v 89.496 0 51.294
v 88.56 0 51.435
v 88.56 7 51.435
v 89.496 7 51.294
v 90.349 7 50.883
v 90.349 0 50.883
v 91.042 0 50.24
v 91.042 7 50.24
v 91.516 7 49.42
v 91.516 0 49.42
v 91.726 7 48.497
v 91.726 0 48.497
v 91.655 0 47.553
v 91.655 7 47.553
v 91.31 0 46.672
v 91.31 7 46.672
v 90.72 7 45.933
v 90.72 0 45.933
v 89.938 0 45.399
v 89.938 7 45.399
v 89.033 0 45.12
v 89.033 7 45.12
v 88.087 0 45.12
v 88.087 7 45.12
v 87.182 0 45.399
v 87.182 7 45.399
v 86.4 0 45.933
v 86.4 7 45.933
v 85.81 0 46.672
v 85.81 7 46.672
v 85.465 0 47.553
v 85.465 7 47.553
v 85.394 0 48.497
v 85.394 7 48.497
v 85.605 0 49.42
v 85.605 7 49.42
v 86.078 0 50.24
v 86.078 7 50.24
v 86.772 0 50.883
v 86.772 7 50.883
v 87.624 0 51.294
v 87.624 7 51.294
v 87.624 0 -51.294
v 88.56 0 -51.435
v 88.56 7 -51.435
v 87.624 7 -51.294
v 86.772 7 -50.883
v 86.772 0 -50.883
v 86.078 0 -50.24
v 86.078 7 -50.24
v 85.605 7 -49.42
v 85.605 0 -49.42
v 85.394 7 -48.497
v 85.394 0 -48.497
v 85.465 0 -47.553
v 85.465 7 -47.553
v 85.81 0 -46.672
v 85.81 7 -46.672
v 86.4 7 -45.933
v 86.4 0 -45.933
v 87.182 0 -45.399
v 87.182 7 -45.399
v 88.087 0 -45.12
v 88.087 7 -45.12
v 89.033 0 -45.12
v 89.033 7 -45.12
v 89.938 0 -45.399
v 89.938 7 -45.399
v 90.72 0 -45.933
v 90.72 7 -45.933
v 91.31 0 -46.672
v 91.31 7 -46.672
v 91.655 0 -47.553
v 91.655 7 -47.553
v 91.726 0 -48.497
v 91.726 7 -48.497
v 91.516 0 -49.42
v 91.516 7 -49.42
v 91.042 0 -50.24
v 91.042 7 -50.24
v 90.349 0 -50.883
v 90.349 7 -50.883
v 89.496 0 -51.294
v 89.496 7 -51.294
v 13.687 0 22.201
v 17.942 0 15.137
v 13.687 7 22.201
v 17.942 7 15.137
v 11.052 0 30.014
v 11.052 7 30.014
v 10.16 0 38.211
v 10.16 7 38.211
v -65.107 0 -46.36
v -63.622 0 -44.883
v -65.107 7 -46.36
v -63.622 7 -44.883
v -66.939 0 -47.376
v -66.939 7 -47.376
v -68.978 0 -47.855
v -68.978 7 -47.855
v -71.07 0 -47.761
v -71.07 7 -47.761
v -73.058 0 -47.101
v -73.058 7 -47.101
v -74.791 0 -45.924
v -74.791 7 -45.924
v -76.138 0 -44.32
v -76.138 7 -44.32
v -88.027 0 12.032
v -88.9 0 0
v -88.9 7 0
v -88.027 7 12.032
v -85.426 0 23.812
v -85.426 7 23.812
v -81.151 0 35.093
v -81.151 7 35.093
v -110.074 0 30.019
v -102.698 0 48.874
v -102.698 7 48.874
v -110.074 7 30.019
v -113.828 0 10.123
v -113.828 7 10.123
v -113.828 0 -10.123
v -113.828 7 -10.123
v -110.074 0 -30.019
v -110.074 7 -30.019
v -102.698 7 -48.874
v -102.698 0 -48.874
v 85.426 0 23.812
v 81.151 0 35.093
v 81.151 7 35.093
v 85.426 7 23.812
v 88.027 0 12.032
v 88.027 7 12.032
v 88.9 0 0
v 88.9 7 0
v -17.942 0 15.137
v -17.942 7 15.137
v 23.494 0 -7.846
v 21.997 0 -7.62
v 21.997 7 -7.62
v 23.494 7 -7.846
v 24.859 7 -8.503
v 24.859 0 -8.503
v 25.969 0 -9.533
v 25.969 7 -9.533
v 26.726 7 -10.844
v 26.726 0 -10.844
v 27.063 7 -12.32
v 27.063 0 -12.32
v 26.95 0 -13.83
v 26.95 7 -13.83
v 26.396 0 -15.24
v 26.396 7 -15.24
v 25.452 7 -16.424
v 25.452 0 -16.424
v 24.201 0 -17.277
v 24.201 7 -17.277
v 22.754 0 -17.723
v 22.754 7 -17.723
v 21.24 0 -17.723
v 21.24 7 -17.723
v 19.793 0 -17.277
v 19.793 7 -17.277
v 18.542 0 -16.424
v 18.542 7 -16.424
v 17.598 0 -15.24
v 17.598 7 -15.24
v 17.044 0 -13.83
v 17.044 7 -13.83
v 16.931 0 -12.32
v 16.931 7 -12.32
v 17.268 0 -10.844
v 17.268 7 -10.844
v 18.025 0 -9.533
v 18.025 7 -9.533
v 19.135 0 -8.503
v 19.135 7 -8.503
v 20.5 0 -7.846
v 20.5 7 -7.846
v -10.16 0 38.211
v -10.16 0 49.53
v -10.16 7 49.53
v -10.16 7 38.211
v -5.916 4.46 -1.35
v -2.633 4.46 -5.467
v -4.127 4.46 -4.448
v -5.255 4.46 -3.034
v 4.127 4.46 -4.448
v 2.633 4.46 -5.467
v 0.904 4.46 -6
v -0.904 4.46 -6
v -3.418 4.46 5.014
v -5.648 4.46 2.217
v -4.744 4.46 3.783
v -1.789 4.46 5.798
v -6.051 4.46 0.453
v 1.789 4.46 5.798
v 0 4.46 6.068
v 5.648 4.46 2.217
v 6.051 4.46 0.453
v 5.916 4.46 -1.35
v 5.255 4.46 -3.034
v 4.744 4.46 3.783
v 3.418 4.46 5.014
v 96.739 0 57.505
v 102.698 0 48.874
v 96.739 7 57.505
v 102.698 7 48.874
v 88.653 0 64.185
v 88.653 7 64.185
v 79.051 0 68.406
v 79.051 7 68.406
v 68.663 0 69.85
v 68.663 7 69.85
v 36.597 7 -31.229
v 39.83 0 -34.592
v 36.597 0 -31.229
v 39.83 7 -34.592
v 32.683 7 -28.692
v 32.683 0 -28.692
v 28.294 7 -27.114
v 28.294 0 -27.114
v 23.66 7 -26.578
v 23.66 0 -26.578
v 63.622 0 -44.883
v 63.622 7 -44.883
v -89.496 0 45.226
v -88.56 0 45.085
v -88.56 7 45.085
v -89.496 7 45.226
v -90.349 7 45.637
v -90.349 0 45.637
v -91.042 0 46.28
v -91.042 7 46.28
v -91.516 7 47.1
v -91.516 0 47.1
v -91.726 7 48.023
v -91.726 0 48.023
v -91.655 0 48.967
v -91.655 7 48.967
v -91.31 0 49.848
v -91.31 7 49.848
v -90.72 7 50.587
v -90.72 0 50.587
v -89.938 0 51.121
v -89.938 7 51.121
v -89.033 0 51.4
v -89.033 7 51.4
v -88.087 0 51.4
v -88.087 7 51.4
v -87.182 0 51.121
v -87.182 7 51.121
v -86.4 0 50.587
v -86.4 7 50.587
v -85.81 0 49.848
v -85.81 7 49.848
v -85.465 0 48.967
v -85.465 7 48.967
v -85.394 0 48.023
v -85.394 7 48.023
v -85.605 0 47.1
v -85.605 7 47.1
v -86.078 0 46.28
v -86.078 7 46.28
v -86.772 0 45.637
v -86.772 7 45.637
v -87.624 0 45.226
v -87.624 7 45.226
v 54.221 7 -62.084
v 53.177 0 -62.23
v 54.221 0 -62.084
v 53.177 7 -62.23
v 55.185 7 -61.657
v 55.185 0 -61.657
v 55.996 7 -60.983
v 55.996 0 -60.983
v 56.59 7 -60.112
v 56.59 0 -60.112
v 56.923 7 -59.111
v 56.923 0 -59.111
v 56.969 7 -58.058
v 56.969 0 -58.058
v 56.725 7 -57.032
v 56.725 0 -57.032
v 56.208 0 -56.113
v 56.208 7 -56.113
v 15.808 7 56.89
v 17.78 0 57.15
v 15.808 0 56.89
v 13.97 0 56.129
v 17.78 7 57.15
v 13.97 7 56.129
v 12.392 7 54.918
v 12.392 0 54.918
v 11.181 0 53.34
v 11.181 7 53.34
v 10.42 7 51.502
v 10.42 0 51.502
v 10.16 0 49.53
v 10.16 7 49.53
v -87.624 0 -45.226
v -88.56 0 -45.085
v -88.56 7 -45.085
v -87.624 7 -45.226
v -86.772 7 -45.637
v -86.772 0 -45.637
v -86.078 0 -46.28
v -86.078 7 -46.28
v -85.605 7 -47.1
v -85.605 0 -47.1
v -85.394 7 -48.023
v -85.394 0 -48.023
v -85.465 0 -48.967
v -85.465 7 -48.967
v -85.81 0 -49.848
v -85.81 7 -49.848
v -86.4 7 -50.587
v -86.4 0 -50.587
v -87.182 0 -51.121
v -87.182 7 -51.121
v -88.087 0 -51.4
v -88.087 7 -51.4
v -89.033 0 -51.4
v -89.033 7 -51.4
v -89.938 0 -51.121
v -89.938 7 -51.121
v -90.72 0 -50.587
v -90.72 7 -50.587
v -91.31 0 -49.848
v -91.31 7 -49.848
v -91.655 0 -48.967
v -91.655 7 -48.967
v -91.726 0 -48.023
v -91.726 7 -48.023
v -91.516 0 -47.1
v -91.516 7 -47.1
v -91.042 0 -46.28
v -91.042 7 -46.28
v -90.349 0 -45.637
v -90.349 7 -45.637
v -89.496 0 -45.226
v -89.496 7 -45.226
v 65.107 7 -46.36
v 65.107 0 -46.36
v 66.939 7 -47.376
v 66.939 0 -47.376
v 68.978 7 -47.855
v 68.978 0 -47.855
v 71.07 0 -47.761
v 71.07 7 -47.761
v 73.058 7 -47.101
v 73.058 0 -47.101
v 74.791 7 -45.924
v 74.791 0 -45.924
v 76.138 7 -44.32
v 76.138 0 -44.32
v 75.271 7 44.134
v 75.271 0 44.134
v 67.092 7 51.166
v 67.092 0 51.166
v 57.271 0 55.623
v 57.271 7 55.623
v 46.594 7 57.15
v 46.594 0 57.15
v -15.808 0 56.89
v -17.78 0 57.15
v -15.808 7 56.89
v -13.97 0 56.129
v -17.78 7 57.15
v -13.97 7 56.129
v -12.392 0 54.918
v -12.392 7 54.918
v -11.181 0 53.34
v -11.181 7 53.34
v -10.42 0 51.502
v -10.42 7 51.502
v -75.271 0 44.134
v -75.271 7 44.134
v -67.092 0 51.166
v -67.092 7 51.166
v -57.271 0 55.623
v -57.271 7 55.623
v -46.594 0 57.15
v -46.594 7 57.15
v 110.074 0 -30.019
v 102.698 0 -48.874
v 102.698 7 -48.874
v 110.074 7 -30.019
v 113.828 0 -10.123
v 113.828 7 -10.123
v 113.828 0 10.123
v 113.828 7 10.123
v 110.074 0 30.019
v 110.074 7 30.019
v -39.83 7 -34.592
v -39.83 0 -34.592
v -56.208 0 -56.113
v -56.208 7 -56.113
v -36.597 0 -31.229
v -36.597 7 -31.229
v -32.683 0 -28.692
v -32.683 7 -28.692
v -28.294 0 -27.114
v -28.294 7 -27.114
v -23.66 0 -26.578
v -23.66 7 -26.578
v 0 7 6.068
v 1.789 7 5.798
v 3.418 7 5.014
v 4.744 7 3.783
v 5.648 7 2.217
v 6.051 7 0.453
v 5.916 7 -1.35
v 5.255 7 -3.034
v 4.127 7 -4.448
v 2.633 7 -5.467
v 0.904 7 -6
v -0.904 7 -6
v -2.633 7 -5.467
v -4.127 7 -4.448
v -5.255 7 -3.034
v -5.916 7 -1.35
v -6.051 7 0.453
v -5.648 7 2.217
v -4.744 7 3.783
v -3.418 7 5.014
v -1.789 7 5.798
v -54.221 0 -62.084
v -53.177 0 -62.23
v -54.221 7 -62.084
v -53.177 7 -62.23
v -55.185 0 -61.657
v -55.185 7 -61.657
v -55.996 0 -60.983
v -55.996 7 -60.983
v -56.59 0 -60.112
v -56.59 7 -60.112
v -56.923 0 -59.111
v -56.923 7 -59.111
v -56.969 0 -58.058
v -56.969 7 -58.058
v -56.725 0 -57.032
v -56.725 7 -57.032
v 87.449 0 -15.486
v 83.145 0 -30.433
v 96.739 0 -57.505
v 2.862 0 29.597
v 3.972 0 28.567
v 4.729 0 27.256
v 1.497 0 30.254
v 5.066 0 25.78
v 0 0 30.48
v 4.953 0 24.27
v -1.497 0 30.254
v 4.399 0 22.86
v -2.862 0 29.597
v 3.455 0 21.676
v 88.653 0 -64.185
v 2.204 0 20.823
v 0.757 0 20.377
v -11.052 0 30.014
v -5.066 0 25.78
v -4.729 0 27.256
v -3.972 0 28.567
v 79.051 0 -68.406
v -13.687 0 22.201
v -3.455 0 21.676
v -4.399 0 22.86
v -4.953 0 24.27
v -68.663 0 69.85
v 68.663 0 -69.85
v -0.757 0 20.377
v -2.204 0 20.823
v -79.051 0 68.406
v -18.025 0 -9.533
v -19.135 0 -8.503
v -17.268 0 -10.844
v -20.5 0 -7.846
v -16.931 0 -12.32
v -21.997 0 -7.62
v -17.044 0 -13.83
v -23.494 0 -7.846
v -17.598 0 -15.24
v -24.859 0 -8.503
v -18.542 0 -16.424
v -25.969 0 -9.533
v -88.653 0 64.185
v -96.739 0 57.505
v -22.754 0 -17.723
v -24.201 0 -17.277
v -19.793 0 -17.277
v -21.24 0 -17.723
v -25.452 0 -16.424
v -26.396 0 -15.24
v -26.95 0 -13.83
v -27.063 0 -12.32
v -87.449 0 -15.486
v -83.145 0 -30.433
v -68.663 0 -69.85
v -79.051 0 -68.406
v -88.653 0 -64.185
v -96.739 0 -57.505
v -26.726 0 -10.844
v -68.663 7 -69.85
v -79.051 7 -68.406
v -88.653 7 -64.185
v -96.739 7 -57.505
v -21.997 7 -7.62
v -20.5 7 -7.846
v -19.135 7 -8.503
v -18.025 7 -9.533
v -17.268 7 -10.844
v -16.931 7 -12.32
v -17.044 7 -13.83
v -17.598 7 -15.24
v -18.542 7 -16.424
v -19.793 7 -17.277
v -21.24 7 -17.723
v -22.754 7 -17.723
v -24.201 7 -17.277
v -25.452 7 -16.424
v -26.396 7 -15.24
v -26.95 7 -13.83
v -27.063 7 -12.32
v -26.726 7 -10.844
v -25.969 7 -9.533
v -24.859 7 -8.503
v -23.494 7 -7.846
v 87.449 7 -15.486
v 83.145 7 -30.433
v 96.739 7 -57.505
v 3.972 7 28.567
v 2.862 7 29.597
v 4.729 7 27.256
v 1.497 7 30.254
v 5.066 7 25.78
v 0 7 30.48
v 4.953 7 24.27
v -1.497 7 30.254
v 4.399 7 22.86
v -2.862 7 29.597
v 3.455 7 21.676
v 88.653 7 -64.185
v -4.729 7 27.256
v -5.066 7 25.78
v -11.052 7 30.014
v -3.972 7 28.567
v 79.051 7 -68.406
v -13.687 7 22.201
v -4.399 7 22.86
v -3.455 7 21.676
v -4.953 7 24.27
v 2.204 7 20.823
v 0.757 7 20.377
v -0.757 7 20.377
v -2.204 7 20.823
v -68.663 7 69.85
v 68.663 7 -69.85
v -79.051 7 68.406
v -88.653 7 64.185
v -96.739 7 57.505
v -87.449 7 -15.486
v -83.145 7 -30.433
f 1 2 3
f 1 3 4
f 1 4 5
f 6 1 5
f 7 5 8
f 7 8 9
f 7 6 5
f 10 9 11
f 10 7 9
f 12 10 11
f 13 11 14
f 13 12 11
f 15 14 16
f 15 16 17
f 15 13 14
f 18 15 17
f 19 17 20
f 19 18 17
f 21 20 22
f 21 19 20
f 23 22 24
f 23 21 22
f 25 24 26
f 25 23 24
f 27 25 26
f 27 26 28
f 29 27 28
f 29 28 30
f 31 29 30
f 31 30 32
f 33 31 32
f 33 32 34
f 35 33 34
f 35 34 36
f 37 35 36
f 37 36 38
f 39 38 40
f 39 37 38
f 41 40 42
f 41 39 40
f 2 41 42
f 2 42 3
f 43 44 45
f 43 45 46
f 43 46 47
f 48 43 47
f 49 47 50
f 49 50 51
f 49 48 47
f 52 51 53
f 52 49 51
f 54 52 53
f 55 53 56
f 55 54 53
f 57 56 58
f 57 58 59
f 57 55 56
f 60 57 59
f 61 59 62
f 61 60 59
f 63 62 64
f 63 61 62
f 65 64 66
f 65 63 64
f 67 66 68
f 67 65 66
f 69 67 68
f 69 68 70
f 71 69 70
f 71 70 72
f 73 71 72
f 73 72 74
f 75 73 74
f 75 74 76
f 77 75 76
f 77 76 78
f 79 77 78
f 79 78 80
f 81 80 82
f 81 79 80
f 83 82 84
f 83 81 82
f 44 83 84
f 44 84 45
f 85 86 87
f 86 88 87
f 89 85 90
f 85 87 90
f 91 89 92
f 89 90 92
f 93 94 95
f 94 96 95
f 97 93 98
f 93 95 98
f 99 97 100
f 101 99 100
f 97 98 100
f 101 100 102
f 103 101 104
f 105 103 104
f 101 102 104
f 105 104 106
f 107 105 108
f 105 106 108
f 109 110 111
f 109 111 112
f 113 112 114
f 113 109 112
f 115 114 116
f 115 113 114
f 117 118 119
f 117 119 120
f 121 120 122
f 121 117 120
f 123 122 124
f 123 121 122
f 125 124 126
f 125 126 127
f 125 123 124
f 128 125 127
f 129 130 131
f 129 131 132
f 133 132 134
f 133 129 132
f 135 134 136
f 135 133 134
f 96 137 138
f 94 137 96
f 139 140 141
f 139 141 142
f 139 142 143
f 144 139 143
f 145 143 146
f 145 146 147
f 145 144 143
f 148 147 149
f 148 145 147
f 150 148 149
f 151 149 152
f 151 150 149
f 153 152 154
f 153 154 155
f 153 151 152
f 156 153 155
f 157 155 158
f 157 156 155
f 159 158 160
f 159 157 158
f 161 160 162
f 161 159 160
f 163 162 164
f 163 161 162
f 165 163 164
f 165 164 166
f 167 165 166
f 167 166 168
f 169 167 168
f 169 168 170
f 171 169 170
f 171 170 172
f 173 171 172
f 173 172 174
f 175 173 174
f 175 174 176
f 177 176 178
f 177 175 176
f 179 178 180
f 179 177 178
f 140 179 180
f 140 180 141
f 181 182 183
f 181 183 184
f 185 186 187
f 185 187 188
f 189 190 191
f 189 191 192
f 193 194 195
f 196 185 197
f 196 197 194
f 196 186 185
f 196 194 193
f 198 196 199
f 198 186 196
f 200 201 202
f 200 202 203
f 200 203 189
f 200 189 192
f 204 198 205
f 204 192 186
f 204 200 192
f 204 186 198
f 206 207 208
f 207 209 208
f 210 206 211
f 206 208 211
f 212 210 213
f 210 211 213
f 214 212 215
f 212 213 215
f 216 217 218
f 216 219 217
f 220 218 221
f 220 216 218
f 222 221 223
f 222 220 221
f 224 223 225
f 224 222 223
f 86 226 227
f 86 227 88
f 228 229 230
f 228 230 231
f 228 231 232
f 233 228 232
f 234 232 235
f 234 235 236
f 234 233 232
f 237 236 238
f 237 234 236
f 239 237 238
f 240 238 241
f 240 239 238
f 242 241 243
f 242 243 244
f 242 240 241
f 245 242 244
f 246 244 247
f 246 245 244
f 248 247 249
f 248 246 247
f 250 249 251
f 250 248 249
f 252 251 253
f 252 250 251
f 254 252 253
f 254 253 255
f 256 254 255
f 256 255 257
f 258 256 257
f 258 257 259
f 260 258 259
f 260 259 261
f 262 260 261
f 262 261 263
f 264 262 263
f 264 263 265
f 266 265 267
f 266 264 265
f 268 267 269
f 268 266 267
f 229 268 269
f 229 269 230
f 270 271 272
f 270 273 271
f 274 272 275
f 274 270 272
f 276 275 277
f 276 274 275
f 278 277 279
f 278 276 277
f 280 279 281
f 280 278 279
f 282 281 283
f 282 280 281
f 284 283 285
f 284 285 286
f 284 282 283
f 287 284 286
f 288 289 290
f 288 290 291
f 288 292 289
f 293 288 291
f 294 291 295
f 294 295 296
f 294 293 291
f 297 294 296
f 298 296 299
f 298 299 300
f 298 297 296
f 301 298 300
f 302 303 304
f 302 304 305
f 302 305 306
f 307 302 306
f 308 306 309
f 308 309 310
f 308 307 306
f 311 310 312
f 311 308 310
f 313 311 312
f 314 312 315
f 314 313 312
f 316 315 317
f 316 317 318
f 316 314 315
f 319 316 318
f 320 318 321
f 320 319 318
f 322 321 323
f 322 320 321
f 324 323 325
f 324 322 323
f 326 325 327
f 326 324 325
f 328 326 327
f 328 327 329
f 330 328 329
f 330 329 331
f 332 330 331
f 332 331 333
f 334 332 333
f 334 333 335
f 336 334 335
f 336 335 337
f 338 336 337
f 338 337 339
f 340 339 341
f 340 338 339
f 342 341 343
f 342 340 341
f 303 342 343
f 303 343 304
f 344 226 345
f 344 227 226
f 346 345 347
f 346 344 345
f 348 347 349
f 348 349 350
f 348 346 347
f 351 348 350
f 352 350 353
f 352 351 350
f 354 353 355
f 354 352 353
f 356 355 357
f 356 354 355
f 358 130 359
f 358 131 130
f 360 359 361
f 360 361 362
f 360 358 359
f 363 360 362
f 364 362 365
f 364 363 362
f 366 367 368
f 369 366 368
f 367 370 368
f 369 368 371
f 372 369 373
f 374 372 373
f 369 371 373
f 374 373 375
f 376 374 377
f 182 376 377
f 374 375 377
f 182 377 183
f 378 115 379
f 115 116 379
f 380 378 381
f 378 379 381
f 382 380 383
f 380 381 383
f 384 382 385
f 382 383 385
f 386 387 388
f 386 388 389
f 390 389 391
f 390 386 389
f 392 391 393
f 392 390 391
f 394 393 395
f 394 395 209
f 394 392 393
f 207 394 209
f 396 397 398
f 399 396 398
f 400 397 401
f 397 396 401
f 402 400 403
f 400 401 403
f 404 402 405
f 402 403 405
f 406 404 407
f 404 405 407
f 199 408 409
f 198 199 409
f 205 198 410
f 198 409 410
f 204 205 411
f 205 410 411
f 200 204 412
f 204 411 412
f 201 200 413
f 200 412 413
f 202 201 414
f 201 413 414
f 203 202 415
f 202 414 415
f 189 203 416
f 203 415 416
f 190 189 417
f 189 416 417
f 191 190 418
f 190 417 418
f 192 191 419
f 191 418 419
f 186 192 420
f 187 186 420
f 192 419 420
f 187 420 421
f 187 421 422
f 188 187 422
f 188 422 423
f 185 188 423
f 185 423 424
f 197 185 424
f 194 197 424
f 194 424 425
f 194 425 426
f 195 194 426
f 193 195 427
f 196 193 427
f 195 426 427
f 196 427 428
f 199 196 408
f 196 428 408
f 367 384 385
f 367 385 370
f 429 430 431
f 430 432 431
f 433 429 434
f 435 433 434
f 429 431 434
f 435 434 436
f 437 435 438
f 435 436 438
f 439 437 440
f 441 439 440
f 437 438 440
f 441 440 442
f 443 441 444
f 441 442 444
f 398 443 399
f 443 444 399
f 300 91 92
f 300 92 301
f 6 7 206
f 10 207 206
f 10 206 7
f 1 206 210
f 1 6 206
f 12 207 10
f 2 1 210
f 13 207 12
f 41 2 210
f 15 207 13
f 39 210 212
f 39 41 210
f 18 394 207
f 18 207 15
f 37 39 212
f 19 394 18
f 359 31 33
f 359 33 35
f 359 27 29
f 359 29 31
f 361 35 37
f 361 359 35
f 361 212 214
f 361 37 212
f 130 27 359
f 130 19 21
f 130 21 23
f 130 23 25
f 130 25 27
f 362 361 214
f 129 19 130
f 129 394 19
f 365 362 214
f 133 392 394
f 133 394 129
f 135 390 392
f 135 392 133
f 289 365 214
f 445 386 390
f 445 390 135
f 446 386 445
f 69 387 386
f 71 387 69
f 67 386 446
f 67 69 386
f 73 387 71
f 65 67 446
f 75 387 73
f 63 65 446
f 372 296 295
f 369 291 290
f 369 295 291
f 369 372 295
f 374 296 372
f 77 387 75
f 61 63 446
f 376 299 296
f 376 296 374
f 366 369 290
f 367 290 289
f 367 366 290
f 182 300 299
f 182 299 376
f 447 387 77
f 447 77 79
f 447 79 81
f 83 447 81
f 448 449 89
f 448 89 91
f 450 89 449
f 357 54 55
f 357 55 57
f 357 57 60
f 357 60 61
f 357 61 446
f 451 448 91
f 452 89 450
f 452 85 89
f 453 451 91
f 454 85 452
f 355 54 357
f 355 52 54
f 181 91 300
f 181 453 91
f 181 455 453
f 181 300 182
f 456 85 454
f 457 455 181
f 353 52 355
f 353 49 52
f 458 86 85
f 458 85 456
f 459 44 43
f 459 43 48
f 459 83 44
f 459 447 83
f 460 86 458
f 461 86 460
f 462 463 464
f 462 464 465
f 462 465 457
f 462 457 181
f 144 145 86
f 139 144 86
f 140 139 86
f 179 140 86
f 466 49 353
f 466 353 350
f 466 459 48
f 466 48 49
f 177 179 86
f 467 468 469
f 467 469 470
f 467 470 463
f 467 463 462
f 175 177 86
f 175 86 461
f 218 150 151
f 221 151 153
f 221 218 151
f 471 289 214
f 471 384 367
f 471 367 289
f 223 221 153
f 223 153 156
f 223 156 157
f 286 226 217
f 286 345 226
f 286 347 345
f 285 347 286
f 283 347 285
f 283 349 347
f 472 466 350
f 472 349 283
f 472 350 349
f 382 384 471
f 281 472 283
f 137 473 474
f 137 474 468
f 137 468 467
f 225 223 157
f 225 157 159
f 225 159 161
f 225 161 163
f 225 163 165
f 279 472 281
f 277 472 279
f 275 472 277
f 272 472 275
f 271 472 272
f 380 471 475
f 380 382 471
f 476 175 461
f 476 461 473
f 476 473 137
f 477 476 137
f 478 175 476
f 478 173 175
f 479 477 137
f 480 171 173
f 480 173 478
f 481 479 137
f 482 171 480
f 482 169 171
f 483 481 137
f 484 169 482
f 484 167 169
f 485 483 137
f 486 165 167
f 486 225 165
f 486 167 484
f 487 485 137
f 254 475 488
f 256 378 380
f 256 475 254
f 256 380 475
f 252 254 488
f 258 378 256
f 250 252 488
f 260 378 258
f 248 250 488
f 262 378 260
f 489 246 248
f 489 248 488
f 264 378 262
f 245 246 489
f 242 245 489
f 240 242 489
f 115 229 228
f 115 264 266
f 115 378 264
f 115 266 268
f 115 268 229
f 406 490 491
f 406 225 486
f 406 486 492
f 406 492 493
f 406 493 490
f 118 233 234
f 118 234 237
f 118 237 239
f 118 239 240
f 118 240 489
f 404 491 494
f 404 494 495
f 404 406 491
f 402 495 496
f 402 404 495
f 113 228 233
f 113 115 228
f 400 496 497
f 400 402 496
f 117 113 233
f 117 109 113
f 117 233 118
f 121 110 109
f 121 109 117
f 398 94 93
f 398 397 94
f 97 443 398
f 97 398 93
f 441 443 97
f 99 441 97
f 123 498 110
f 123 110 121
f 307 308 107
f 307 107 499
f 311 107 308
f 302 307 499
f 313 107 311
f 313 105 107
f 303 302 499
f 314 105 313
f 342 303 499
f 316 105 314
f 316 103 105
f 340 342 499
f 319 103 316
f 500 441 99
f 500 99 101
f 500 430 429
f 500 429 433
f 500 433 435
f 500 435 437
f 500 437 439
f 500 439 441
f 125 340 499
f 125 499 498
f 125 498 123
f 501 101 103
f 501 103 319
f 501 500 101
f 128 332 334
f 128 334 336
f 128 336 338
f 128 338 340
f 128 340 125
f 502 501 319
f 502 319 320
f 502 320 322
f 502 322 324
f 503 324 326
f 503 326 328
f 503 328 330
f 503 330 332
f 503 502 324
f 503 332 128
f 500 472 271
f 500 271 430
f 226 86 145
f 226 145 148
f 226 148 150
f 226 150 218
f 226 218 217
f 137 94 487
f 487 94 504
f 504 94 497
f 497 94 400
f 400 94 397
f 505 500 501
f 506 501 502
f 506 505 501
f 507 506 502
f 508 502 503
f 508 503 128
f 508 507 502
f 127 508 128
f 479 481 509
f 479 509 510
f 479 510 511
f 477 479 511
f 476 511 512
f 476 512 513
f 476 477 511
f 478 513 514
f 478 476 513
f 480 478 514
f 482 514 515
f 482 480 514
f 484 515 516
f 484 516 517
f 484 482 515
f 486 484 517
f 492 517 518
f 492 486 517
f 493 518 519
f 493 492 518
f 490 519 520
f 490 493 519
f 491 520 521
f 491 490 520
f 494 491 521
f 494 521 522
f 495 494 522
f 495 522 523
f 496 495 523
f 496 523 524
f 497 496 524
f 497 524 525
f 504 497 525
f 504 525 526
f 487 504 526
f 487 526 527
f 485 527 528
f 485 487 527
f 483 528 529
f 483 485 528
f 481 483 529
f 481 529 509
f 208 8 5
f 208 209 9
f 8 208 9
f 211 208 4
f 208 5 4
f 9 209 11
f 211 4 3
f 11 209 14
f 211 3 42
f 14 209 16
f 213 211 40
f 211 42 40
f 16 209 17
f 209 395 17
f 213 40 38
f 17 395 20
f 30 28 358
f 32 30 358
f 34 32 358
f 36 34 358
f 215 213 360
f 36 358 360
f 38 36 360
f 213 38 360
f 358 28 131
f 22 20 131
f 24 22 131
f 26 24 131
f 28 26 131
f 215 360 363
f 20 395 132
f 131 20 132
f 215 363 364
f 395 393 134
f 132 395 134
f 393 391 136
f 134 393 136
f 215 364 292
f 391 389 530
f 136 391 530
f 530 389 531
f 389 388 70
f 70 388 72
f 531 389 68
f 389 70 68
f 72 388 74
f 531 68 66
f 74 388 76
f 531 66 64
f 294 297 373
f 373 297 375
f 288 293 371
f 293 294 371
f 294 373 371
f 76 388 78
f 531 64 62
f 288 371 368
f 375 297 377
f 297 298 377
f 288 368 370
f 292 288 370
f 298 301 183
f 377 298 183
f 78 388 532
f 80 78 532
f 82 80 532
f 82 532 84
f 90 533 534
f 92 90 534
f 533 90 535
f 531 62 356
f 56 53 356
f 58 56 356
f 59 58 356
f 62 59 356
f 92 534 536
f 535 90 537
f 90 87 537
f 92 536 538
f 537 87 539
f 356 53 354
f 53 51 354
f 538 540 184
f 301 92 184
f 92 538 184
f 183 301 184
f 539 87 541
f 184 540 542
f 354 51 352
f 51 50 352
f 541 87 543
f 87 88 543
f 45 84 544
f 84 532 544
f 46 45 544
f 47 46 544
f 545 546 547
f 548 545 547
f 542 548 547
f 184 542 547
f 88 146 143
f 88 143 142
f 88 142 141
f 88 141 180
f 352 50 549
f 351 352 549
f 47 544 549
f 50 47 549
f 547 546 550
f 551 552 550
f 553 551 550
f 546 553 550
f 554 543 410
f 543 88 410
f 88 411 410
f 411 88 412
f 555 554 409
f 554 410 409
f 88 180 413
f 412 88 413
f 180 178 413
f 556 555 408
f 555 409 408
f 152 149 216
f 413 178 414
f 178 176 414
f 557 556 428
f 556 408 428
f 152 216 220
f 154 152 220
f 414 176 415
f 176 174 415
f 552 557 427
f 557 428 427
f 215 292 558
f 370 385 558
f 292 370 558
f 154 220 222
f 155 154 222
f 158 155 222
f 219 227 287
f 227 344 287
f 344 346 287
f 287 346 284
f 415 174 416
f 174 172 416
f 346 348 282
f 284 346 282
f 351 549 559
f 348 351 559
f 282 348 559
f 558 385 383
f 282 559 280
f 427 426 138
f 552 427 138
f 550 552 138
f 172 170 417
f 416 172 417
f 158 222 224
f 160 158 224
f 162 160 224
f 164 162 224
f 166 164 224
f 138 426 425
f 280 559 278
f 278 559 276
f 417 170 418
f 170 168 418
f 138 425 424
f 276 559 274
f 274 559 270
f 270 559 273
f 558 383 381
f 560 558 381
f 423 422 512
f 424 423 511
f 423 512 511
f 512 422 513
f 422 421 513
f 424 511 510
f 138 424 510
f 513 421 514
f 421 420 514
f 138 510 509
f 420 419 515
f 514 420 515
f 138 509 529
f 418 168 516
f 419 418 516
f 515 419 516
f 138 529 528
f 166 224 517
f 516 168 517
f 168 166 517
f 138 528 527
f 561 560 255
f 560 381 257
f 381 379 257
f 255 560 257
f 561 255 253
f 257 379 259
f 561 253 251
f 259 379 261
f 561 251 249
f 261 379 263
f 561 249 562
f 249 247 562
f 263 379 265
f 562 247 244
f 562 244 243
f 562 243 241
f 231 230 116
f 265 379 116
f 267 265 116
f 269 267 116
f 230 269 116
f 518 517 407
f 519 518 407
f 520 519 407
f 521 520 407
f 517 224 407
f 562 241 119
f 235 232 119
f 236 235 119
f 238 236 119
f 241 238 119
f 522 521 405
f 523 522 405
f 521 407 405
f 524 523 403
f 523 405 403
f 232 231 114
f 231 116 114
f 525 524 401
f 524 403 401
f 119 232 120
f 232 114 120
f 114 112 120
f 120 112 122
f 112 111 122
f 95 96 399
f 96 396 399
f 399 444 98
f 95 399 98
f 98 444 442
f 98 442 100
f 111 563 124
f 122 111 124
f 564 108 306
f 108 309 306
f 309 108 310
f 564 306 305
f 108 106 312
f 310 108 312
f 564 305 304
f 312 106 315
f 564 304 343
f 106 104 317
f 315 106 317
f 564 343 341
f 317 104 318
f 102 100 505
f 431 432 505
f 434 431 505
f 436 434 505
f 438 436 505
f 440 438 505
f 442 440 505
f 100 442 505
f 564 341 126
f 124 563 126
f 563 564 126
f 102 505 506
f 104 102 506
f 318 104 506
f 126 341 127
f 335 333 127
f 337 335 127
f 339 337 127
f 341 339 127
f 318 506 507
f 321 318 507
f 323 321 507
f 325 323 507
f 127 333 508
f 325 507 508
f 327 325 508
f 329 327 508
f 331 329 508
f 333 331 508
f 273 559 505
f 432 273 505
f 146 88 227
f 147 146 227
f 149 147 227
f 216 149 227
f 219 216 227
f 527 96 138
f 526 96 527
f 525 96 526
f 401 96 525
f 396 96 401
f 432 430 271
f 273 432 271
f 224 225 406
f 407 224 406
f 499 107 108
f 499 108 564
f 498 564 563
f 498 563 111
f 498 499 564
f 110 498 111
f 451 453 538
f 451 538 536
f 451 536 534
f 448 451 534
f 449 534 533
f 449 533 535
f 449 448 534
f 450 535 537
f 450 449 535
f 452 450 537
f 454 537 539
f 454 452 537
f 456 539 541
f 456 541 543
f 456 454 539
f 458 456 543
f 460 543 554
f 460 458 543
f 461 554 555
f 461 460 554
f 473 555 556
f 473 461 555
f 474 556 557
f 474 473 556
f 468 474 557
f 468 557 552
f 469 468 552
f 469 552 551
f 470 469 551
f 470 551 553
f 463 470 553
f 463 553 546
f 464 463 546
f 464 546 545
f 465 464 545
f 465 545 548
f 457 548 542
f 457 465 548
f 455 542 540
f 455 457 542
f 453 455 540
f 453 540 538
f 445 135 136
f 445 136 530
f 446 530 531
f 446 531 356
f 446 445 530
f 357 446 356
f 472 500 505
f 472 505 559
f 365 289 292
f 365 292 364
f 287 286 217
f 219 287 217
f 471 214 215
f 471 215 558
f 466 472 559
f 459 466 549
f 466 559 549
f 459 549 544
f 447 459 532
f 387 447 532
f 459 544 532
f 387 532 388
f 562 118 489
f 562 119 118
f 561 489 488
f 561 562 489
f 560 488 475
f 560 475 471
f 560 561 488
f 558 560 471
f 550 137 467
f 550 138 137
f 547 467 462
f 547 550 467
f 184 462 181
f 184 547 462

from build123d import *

# Parameters (mm, degrees)
SKETCH1_R           = 5.08
SKETCH1_R_2         = 3.175
BOSS_EXTRUDE1_DEPTH = 7
FILLET6_R           = 38.1
FILLET9_R           = 7.62
FILLET10_R          = 7.62
FILLET11_R          = 3.81
FILLET12_R          = 20.32
FILLET13_R          = 38.1
SKETCH2_R           = 6.067865864
CUT_EXTRUDE1_DEPTH  = 2.54


with BuildPart() as part:
    # Sketch1 → Boss-Extrude1 (new body)
    with BuildSketch(Plane(origin=(0, 0, 0), x_dir=(1, 0, 0), z_dir=(0, 1, 0))):
        with BuildLine():
            Line((-88.899351346, 69.85), (88.899351346, 69.85))
            ThreePointArc((88.899351346, 69.85), (114.3, 0), (88.899351346, -69.85))
            Line((88.899351346, -69.85), (-88.899351346, -69.85))
            ThreePointArc((-88.899351346, -69.85), (-114.3, 0), (-88.899351346, 69.85))
        make_face()
        with Locations(Location((0, -25.4, 0), (0, 0, 270))):
            Circle(SKETCH1_R, mode=Mode.SUBTRACT)
        with Locations(Location((-21.997045256, 12.7, 0), (0, 0, 270))):
            Circle(SKETCH1_R, mode=Mode.SUBTRACT)
        with Locations(Location((21.997045256, 12.7, 0), (0, 0, 270))):
            Circle(SKETCH1_R, mode=Mode.SUBTRACT)
        with Locations(Location((-88.560044244, 48.26, 0), (0, 0, 270))):
            Circle(SKETCH1_R_2, mode=Mode.SUBTRACT)
        with Locations(Location((-88.560044244, -48.26, 0), (0, 0, 90))):
            Circle(SKETCH1_R_2, mode=Mode.SUBTRACT)
        with Locations(Location((88.560044244, -48.26, 0), (0, 0, 270))):
            Circle(SKETCH1_R_2, mode=Mode.SUBTRACT)
        with Locations(Location((88.560044244, 48.26, 0), (0, 0, 90))):
            Circle(SKETCH1_R_2, mode=Mode.SUBTRACT)
        Polygon((-60.864265129, 62.23), (60.864265129, 62.23), (33.730665032, 26.578259891), (-33.730665032, 26.578259891), align=None, mode=Mode.SUBTRACT)
        with BuildLine():
            Line((-66.2189372, -57.15), (-10.16, -57.15))
            Line((-10.16, -57.15), (-10.16, -25.362104437))
            Line((-10.16, -25.362104437), (-69.836388427, 53.048688207))
            ThreePointArc((-69.836388427, 53.048688207), (-83.989429266, 28.185034179), (-88.9, 0))
            ThreePointArc((-88.9, 0), (-83.022483728, -30.743101298), (-66.2189372, -57.15))
        make_face(mode=Mode.SUBTRACT)
        with BuildLine():
            Line((10.16, -25.362104437), (10.16, -57.15))
            Line((10.16, -57.15), (66.2189372, -57.15))
            ThreePointArc((66.2189372, -57.15), (83.022483728, -30.743101298), (88.9, 0))
            ThreePointArc((88.9, 0), (83.989429266, 28.185034179), (69.836388427, 53.048688207))
            Line((69.836388427, 53.048688207), (10.16, -25.362104437))
        make_face(mode=Mode.SUBTRACT)
    extrude(amount=BOSS_EXTRUDE1_DEPTH)

    # Fillet6
    fillet6_edges = [part.edges().sort_by_distance(p)[0] for p in [
        (-66.2189372, 3.5, 57.15),
        (66.2189372, 3.5, 57.15),
        (-88.899351346, 3.5, -69.85),
        (88.899351346, 3.5, -69.85),
        (88.899351346, 3.5, 69.85),
        (-88.899351346, 3.5, 69.85),
    ]]
    fillet(fillet6_edges, radius=FILLET6_R)

    # Fillet9
    fillet9_edges = [part.edges().sort_by_distance(p)[0] for p in [
        (-10.16, 3.5, 57.15),
        (10.16, 3.5, 57.15),
    ]]
    fillet(fillet9_edges, radius=FILLET9_R)

    # Fillet10
    fillet10_edges = [part.edges().sort_by_distance(p)[0] for p in [
        (-69.836388427, 3.5, -53.048688207),
        (69.836388427, 3.5, -53.048688207),
    ]]
    fillet(fillet10_edges, radius=FILLET10_R)

    # Fillet11
    fillet11_edges = [part.edges().sort_by_distance(p)[0] for p in [
        (60.864265129, 3.5, -62.23),
        (-60.864265129, 3.5, -62.23),
    ]]
    fillet(fillet11_edges, radius=FILLET11_R)

    # Fillet12
    fillet12_edges = [part.edges().sort_by_distance(p)[0] for p in [
        (33.730665032, 3.5, -26.578259891),
        (-33.730665032, 3.5, -26.578259891),
    ]]
    fillet(fillet12_edges, radius=FILLET12_R)

    # Fillet13
    fillet13_edges = [part.edges().sort_by_distance(p)[0] for p in [
        (-10.16, 3.5, 25.362104437),
        (10.16, 3.5, 25.362104437),
    ]]
    fillet(fillet13_edges, radius=FILLET13_R)

    # Sketch2 → Cut-Extrude1 (cut)
    with BuildSketch(Plane(origin=(0, 7, 0), x_dir=(1, 0, 0), z_dir=(0, 1, 0))):
        with Locations(Location((0, 0, 0), (0, 0, 270))):
            Circle(SKETCH2_R)
    extrude(amount=-CUT_EXTRUDE1_DEPTH, mode=Mode.SUBTRACT)


solid = part.part
